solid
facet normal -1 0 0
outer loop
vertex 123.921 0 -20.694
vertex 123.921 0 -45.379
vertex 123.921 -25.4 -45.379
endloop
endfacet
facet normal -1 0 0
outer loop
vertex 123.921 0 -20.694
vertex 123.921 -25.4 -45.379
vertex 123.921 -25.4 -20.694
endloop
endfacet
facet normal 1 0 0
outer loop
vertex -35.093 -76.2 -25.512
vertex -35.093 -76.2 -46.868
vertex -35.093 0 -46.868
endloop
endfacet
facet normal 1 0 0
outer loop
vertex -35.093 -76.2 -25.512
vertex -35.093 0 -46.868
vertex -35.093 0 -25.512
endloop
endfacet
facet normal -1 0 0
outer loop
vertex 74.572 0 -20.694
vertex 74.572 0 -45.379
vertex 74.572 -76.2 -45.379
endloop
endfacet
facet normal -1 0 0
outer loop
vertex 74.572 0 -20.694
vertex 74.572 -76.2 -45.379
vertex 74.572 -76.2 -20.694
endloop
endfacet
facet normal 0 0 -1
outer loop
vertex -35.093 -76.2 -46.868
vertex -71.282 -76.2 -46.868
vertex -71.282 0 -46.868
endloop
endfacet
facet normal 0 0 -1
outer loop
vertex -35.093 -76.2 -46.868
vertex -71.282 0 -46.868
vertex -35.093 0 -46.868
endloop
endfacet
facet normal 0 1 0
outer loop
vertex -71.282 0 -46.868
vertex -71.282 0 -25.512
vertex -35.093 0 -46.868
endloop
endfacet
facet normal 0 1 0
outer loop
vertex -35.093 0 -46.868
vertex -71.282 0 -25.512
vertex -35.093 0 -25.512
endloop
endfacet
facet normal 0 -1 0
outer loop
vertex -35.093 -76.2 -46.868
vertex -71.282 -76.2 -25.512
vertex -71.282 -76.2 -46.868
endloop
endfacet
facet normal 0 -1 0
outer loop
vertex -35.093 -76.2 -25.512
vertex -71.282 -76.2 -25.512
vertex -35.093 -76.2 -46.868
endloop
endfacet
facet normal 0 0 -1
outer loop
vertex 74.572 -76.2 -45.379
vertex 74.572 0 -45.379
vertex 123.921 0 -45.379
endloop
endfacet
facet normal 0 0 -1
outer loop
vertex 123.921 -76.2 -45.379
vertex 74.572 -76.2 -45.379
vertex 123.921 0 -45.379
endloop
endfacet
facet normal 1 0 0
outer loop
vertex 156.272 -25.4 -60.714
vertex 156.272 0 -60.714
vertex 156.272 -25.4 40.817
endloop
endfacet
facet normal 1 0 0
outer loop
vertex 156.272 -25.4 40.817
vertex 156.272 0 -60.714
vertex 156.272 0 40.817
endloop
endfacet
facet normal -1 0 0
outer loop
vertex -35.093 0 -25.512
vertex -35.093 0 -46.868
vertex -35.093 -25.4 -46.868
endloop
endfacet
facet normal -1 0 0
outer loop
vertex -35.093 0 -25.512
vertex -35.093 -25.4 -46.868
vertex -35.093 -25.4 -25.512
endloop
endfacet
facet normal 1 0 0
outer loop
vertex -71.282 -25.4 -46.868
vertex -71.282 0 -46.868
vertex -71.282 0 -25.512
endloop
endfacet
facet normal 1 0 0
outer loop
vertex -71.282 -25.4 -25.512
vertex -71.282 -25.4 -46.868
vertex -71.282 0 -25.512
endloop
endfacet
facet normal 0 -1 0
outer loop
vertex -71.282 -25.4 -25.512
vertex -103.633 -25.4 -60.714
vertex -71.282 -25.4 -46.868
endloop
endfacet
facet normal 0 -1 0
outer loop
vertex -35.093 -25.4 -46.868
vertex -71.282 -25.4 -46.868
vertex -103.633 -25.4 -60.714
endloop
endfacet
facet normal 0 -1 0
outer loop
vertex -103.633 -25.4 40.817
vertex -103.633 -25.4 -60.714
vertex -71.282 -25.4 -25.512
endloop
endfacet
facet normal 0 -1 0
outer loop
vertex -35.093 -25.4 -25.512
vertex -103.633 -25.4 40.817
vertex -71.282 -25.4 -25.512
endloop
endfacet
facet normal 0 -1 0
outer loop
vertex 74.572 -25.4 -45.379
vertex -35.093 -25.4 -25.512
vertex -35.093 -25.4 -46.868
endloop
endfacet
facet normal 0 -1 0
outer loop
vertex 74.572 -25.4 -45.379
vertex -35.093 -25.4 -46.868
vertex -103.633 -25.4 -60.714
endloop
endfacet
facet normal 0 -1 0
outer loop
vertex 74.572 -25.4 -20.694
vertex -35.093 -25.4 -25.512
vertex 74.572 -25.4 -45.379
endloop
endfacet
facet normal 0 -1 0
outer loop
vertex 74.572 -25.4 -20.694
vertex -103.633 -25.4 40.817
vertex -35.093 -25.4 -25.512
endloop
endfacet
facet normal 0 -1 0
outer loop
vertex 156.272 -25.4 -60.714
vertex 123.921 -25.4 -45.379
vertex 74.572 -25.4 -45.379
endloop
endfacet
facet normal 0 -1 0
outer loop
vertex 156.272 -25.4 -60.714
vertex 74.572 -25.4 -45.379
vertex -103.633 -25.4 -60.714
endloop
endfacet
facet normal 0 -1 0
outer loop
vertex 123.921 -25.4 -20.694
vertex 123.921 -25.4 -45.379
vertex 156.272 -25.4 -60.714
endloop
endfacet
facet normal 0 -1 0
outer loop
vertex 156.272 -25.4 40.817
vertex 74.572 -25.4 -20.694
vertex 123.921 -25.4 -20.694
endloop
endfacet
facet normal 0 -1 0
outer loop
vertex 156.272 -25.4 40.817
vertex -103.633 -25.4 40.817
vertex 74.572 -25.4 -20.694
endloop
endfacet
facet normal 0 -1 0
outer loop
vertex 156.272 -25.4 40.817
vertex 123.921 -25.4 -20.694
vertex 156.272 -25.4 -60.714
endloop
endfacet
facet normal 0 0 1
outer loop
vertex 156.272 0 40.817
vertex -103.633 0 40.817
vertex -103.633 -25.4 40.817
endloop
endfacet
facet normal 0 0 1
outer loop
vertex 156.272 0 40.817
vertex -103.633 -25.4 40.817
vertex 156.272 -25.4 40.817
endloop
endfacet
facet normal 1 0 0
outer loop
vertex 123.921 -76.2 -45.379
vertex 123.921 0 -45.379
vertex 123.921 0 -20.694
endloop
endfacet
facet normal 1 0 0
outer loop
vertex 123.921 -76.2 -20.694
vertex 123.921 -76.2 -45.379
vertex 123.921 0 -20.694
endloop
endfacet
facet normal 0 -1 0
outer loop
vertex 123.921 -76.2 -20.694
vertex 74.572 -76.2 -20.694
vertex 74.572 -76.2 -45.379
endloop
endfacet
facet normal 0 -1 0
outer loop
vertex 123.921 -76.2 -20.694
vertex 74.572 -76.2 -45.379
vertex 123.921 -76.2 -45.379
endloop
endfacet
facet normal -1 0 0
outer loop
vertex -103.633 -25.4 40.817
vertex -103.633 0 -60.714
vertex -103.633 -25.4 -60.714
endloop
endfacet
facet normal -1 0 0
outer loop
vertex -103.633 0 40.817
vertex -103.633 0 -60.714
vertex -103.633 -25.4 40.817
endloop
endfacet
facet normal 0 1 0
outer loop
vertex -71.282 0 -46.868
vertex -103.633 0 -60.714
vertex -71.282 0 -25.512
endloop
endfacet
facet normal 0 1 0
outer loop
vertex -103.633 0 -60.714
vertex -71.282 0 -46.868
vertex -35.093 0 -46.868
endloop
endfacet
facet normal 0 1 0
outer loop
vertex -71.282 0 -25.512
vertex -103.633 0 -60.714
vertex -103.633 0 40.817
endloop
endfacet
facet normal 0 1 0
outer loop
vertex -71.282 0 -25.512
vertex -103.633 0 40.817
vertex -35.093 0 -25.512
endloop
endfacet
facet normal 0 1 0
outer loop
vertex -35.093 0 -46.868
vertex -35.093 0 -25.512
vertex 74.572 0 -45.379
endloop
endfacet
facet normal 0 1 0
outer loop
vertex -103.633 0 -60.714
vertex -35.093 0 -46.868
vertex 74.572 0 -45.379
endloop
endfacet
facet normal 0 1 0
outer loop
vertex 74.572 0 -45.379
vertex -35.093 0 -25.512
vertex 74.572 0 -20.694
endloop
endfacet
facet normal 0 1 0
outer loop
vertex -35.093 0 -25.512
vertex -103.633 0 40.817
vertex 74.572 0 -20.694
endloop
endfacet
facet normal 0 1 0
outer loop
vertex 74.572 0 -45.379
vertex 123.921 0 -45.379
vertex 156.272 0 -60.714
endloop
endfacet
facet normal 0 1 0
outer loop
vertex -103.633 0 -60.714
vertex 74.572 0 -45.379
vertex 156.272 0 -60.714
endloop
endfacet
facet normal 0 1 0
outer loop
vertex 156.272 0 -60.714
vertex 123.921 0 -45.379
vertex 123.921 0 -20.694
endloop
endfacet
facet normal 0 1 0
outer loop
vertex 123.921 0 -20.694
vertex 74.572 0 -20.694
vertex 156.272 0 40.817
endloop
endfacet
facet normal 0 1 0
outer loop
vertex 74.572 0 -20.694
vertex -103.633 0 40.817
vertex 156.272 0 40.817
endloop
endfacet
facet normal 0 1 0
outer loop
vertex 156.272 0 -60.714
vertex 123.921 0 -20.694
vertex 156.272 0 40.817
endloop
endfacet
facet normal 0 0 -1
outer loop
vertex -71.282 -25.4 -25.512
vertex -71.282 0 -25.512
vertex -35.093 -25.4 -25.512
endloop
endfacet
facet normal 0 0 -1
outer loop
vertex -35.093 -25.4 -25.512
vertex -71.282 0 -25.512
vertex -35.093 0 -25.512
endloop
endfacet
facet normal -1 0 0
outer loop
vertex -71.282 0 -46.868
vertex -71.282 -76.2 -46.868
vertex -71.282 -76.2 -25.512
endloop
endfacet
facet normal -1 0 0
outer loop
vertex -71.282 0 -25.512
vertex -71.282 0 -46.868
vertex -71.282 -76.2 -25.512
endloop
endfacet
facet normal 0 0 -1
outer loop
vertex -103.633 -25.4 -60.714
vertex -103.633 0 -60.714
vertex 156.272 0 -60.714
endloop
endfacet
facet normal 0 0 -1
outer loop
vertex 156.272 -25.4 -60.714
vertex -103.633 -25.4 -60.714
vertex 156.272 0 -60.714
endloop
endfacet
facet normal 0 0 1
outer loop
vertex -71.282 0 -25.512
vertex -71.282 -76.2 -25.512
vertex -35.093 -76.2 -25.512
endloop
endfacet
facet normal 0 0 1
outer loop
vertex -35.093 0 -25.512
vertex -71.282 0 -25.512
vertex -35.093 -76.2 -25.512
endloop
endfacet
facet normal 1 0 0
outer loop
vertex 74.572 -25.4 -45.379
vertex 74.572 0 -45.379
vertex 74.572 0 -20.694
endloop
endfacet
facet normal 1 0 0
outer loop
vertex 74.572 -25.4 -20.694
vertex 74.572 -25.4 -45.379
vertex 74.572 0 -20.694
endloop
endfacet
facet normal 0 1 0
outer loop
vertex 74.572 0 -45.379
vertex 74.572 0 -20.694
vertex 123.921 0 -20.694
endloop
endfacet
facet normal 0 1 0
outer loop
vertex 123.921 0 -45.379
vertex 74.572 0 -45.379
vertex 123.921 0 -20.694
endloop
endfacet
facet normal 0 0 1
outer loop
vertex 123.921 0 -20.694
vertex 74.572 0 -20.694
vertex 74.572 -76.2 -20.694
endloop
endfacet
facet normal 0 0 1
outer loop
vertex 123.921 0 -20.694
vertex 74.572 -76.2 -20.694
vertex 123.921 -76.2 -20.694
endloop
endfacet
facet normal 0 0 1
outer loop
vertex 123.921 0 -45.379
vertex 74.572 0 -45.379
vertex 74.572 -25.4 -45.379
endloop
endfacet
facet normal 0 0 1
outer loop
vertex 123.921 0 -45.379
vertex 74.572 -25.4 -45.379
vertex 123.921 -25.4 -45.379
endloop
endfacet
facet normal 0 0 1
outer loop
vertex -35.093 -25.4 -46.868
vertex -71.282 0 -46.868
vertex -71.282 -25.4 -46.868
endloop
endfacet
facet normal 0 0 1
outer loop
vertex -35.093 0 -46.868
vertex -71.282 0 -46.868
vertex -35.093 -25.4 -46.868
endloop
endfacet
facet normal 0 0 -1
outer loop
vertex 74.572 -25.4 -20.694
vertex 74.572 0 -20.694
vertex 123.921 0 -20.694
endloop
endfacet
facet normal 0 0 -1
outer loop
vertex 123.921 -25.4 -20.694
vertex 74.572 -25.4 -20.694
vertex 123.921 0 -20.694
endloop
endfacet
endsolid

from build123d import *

# Parameters (mm, degrees)
F0_W     = 36.189217
F0_H     = 21.355719
F0_W_2   = 49.348921
F0_H_2   = 24.685026
F1_DEPTH = 76.2
F0_W_3   = 259.90437
F0_H_3   = 101.53158
F2_DEPTH = 25.4


with BuildPart() as f1:
    # F0 (on Front) → F1 (new body)
    with BuildSketch(Plane.XZ):
        with Locations((-53.187182, -36.190036)):
            Rectangle(F0_W, F0_H)
        with Locations((99.246182, -33.036258)):
            Rectangle(F0_W_2, F0_H_2)
    extrude(amount=F1_DEPTH)


with BuildPart() as f2:
    # F0 (on Front) → F2 (new body)
    with BuildSketch(Plane.XZ):
        with Locations((26.319437, -9.948522)):
            Rectangle(F0_W_3, F0_H_3)
        with Locations((-53.187182, -36.190036)):
            Rectangle(F0_W, F0_H, mode=Mode.SUBTRACT)
        with Locations((99.246182, -33.036258)):
            Rectangle(F0_W_2, F0_H_2, mode=Mode.SUBTRACT)
    extrude(amount=F2_DEPTH)


solid = Compound([f1.part, f2.part])
